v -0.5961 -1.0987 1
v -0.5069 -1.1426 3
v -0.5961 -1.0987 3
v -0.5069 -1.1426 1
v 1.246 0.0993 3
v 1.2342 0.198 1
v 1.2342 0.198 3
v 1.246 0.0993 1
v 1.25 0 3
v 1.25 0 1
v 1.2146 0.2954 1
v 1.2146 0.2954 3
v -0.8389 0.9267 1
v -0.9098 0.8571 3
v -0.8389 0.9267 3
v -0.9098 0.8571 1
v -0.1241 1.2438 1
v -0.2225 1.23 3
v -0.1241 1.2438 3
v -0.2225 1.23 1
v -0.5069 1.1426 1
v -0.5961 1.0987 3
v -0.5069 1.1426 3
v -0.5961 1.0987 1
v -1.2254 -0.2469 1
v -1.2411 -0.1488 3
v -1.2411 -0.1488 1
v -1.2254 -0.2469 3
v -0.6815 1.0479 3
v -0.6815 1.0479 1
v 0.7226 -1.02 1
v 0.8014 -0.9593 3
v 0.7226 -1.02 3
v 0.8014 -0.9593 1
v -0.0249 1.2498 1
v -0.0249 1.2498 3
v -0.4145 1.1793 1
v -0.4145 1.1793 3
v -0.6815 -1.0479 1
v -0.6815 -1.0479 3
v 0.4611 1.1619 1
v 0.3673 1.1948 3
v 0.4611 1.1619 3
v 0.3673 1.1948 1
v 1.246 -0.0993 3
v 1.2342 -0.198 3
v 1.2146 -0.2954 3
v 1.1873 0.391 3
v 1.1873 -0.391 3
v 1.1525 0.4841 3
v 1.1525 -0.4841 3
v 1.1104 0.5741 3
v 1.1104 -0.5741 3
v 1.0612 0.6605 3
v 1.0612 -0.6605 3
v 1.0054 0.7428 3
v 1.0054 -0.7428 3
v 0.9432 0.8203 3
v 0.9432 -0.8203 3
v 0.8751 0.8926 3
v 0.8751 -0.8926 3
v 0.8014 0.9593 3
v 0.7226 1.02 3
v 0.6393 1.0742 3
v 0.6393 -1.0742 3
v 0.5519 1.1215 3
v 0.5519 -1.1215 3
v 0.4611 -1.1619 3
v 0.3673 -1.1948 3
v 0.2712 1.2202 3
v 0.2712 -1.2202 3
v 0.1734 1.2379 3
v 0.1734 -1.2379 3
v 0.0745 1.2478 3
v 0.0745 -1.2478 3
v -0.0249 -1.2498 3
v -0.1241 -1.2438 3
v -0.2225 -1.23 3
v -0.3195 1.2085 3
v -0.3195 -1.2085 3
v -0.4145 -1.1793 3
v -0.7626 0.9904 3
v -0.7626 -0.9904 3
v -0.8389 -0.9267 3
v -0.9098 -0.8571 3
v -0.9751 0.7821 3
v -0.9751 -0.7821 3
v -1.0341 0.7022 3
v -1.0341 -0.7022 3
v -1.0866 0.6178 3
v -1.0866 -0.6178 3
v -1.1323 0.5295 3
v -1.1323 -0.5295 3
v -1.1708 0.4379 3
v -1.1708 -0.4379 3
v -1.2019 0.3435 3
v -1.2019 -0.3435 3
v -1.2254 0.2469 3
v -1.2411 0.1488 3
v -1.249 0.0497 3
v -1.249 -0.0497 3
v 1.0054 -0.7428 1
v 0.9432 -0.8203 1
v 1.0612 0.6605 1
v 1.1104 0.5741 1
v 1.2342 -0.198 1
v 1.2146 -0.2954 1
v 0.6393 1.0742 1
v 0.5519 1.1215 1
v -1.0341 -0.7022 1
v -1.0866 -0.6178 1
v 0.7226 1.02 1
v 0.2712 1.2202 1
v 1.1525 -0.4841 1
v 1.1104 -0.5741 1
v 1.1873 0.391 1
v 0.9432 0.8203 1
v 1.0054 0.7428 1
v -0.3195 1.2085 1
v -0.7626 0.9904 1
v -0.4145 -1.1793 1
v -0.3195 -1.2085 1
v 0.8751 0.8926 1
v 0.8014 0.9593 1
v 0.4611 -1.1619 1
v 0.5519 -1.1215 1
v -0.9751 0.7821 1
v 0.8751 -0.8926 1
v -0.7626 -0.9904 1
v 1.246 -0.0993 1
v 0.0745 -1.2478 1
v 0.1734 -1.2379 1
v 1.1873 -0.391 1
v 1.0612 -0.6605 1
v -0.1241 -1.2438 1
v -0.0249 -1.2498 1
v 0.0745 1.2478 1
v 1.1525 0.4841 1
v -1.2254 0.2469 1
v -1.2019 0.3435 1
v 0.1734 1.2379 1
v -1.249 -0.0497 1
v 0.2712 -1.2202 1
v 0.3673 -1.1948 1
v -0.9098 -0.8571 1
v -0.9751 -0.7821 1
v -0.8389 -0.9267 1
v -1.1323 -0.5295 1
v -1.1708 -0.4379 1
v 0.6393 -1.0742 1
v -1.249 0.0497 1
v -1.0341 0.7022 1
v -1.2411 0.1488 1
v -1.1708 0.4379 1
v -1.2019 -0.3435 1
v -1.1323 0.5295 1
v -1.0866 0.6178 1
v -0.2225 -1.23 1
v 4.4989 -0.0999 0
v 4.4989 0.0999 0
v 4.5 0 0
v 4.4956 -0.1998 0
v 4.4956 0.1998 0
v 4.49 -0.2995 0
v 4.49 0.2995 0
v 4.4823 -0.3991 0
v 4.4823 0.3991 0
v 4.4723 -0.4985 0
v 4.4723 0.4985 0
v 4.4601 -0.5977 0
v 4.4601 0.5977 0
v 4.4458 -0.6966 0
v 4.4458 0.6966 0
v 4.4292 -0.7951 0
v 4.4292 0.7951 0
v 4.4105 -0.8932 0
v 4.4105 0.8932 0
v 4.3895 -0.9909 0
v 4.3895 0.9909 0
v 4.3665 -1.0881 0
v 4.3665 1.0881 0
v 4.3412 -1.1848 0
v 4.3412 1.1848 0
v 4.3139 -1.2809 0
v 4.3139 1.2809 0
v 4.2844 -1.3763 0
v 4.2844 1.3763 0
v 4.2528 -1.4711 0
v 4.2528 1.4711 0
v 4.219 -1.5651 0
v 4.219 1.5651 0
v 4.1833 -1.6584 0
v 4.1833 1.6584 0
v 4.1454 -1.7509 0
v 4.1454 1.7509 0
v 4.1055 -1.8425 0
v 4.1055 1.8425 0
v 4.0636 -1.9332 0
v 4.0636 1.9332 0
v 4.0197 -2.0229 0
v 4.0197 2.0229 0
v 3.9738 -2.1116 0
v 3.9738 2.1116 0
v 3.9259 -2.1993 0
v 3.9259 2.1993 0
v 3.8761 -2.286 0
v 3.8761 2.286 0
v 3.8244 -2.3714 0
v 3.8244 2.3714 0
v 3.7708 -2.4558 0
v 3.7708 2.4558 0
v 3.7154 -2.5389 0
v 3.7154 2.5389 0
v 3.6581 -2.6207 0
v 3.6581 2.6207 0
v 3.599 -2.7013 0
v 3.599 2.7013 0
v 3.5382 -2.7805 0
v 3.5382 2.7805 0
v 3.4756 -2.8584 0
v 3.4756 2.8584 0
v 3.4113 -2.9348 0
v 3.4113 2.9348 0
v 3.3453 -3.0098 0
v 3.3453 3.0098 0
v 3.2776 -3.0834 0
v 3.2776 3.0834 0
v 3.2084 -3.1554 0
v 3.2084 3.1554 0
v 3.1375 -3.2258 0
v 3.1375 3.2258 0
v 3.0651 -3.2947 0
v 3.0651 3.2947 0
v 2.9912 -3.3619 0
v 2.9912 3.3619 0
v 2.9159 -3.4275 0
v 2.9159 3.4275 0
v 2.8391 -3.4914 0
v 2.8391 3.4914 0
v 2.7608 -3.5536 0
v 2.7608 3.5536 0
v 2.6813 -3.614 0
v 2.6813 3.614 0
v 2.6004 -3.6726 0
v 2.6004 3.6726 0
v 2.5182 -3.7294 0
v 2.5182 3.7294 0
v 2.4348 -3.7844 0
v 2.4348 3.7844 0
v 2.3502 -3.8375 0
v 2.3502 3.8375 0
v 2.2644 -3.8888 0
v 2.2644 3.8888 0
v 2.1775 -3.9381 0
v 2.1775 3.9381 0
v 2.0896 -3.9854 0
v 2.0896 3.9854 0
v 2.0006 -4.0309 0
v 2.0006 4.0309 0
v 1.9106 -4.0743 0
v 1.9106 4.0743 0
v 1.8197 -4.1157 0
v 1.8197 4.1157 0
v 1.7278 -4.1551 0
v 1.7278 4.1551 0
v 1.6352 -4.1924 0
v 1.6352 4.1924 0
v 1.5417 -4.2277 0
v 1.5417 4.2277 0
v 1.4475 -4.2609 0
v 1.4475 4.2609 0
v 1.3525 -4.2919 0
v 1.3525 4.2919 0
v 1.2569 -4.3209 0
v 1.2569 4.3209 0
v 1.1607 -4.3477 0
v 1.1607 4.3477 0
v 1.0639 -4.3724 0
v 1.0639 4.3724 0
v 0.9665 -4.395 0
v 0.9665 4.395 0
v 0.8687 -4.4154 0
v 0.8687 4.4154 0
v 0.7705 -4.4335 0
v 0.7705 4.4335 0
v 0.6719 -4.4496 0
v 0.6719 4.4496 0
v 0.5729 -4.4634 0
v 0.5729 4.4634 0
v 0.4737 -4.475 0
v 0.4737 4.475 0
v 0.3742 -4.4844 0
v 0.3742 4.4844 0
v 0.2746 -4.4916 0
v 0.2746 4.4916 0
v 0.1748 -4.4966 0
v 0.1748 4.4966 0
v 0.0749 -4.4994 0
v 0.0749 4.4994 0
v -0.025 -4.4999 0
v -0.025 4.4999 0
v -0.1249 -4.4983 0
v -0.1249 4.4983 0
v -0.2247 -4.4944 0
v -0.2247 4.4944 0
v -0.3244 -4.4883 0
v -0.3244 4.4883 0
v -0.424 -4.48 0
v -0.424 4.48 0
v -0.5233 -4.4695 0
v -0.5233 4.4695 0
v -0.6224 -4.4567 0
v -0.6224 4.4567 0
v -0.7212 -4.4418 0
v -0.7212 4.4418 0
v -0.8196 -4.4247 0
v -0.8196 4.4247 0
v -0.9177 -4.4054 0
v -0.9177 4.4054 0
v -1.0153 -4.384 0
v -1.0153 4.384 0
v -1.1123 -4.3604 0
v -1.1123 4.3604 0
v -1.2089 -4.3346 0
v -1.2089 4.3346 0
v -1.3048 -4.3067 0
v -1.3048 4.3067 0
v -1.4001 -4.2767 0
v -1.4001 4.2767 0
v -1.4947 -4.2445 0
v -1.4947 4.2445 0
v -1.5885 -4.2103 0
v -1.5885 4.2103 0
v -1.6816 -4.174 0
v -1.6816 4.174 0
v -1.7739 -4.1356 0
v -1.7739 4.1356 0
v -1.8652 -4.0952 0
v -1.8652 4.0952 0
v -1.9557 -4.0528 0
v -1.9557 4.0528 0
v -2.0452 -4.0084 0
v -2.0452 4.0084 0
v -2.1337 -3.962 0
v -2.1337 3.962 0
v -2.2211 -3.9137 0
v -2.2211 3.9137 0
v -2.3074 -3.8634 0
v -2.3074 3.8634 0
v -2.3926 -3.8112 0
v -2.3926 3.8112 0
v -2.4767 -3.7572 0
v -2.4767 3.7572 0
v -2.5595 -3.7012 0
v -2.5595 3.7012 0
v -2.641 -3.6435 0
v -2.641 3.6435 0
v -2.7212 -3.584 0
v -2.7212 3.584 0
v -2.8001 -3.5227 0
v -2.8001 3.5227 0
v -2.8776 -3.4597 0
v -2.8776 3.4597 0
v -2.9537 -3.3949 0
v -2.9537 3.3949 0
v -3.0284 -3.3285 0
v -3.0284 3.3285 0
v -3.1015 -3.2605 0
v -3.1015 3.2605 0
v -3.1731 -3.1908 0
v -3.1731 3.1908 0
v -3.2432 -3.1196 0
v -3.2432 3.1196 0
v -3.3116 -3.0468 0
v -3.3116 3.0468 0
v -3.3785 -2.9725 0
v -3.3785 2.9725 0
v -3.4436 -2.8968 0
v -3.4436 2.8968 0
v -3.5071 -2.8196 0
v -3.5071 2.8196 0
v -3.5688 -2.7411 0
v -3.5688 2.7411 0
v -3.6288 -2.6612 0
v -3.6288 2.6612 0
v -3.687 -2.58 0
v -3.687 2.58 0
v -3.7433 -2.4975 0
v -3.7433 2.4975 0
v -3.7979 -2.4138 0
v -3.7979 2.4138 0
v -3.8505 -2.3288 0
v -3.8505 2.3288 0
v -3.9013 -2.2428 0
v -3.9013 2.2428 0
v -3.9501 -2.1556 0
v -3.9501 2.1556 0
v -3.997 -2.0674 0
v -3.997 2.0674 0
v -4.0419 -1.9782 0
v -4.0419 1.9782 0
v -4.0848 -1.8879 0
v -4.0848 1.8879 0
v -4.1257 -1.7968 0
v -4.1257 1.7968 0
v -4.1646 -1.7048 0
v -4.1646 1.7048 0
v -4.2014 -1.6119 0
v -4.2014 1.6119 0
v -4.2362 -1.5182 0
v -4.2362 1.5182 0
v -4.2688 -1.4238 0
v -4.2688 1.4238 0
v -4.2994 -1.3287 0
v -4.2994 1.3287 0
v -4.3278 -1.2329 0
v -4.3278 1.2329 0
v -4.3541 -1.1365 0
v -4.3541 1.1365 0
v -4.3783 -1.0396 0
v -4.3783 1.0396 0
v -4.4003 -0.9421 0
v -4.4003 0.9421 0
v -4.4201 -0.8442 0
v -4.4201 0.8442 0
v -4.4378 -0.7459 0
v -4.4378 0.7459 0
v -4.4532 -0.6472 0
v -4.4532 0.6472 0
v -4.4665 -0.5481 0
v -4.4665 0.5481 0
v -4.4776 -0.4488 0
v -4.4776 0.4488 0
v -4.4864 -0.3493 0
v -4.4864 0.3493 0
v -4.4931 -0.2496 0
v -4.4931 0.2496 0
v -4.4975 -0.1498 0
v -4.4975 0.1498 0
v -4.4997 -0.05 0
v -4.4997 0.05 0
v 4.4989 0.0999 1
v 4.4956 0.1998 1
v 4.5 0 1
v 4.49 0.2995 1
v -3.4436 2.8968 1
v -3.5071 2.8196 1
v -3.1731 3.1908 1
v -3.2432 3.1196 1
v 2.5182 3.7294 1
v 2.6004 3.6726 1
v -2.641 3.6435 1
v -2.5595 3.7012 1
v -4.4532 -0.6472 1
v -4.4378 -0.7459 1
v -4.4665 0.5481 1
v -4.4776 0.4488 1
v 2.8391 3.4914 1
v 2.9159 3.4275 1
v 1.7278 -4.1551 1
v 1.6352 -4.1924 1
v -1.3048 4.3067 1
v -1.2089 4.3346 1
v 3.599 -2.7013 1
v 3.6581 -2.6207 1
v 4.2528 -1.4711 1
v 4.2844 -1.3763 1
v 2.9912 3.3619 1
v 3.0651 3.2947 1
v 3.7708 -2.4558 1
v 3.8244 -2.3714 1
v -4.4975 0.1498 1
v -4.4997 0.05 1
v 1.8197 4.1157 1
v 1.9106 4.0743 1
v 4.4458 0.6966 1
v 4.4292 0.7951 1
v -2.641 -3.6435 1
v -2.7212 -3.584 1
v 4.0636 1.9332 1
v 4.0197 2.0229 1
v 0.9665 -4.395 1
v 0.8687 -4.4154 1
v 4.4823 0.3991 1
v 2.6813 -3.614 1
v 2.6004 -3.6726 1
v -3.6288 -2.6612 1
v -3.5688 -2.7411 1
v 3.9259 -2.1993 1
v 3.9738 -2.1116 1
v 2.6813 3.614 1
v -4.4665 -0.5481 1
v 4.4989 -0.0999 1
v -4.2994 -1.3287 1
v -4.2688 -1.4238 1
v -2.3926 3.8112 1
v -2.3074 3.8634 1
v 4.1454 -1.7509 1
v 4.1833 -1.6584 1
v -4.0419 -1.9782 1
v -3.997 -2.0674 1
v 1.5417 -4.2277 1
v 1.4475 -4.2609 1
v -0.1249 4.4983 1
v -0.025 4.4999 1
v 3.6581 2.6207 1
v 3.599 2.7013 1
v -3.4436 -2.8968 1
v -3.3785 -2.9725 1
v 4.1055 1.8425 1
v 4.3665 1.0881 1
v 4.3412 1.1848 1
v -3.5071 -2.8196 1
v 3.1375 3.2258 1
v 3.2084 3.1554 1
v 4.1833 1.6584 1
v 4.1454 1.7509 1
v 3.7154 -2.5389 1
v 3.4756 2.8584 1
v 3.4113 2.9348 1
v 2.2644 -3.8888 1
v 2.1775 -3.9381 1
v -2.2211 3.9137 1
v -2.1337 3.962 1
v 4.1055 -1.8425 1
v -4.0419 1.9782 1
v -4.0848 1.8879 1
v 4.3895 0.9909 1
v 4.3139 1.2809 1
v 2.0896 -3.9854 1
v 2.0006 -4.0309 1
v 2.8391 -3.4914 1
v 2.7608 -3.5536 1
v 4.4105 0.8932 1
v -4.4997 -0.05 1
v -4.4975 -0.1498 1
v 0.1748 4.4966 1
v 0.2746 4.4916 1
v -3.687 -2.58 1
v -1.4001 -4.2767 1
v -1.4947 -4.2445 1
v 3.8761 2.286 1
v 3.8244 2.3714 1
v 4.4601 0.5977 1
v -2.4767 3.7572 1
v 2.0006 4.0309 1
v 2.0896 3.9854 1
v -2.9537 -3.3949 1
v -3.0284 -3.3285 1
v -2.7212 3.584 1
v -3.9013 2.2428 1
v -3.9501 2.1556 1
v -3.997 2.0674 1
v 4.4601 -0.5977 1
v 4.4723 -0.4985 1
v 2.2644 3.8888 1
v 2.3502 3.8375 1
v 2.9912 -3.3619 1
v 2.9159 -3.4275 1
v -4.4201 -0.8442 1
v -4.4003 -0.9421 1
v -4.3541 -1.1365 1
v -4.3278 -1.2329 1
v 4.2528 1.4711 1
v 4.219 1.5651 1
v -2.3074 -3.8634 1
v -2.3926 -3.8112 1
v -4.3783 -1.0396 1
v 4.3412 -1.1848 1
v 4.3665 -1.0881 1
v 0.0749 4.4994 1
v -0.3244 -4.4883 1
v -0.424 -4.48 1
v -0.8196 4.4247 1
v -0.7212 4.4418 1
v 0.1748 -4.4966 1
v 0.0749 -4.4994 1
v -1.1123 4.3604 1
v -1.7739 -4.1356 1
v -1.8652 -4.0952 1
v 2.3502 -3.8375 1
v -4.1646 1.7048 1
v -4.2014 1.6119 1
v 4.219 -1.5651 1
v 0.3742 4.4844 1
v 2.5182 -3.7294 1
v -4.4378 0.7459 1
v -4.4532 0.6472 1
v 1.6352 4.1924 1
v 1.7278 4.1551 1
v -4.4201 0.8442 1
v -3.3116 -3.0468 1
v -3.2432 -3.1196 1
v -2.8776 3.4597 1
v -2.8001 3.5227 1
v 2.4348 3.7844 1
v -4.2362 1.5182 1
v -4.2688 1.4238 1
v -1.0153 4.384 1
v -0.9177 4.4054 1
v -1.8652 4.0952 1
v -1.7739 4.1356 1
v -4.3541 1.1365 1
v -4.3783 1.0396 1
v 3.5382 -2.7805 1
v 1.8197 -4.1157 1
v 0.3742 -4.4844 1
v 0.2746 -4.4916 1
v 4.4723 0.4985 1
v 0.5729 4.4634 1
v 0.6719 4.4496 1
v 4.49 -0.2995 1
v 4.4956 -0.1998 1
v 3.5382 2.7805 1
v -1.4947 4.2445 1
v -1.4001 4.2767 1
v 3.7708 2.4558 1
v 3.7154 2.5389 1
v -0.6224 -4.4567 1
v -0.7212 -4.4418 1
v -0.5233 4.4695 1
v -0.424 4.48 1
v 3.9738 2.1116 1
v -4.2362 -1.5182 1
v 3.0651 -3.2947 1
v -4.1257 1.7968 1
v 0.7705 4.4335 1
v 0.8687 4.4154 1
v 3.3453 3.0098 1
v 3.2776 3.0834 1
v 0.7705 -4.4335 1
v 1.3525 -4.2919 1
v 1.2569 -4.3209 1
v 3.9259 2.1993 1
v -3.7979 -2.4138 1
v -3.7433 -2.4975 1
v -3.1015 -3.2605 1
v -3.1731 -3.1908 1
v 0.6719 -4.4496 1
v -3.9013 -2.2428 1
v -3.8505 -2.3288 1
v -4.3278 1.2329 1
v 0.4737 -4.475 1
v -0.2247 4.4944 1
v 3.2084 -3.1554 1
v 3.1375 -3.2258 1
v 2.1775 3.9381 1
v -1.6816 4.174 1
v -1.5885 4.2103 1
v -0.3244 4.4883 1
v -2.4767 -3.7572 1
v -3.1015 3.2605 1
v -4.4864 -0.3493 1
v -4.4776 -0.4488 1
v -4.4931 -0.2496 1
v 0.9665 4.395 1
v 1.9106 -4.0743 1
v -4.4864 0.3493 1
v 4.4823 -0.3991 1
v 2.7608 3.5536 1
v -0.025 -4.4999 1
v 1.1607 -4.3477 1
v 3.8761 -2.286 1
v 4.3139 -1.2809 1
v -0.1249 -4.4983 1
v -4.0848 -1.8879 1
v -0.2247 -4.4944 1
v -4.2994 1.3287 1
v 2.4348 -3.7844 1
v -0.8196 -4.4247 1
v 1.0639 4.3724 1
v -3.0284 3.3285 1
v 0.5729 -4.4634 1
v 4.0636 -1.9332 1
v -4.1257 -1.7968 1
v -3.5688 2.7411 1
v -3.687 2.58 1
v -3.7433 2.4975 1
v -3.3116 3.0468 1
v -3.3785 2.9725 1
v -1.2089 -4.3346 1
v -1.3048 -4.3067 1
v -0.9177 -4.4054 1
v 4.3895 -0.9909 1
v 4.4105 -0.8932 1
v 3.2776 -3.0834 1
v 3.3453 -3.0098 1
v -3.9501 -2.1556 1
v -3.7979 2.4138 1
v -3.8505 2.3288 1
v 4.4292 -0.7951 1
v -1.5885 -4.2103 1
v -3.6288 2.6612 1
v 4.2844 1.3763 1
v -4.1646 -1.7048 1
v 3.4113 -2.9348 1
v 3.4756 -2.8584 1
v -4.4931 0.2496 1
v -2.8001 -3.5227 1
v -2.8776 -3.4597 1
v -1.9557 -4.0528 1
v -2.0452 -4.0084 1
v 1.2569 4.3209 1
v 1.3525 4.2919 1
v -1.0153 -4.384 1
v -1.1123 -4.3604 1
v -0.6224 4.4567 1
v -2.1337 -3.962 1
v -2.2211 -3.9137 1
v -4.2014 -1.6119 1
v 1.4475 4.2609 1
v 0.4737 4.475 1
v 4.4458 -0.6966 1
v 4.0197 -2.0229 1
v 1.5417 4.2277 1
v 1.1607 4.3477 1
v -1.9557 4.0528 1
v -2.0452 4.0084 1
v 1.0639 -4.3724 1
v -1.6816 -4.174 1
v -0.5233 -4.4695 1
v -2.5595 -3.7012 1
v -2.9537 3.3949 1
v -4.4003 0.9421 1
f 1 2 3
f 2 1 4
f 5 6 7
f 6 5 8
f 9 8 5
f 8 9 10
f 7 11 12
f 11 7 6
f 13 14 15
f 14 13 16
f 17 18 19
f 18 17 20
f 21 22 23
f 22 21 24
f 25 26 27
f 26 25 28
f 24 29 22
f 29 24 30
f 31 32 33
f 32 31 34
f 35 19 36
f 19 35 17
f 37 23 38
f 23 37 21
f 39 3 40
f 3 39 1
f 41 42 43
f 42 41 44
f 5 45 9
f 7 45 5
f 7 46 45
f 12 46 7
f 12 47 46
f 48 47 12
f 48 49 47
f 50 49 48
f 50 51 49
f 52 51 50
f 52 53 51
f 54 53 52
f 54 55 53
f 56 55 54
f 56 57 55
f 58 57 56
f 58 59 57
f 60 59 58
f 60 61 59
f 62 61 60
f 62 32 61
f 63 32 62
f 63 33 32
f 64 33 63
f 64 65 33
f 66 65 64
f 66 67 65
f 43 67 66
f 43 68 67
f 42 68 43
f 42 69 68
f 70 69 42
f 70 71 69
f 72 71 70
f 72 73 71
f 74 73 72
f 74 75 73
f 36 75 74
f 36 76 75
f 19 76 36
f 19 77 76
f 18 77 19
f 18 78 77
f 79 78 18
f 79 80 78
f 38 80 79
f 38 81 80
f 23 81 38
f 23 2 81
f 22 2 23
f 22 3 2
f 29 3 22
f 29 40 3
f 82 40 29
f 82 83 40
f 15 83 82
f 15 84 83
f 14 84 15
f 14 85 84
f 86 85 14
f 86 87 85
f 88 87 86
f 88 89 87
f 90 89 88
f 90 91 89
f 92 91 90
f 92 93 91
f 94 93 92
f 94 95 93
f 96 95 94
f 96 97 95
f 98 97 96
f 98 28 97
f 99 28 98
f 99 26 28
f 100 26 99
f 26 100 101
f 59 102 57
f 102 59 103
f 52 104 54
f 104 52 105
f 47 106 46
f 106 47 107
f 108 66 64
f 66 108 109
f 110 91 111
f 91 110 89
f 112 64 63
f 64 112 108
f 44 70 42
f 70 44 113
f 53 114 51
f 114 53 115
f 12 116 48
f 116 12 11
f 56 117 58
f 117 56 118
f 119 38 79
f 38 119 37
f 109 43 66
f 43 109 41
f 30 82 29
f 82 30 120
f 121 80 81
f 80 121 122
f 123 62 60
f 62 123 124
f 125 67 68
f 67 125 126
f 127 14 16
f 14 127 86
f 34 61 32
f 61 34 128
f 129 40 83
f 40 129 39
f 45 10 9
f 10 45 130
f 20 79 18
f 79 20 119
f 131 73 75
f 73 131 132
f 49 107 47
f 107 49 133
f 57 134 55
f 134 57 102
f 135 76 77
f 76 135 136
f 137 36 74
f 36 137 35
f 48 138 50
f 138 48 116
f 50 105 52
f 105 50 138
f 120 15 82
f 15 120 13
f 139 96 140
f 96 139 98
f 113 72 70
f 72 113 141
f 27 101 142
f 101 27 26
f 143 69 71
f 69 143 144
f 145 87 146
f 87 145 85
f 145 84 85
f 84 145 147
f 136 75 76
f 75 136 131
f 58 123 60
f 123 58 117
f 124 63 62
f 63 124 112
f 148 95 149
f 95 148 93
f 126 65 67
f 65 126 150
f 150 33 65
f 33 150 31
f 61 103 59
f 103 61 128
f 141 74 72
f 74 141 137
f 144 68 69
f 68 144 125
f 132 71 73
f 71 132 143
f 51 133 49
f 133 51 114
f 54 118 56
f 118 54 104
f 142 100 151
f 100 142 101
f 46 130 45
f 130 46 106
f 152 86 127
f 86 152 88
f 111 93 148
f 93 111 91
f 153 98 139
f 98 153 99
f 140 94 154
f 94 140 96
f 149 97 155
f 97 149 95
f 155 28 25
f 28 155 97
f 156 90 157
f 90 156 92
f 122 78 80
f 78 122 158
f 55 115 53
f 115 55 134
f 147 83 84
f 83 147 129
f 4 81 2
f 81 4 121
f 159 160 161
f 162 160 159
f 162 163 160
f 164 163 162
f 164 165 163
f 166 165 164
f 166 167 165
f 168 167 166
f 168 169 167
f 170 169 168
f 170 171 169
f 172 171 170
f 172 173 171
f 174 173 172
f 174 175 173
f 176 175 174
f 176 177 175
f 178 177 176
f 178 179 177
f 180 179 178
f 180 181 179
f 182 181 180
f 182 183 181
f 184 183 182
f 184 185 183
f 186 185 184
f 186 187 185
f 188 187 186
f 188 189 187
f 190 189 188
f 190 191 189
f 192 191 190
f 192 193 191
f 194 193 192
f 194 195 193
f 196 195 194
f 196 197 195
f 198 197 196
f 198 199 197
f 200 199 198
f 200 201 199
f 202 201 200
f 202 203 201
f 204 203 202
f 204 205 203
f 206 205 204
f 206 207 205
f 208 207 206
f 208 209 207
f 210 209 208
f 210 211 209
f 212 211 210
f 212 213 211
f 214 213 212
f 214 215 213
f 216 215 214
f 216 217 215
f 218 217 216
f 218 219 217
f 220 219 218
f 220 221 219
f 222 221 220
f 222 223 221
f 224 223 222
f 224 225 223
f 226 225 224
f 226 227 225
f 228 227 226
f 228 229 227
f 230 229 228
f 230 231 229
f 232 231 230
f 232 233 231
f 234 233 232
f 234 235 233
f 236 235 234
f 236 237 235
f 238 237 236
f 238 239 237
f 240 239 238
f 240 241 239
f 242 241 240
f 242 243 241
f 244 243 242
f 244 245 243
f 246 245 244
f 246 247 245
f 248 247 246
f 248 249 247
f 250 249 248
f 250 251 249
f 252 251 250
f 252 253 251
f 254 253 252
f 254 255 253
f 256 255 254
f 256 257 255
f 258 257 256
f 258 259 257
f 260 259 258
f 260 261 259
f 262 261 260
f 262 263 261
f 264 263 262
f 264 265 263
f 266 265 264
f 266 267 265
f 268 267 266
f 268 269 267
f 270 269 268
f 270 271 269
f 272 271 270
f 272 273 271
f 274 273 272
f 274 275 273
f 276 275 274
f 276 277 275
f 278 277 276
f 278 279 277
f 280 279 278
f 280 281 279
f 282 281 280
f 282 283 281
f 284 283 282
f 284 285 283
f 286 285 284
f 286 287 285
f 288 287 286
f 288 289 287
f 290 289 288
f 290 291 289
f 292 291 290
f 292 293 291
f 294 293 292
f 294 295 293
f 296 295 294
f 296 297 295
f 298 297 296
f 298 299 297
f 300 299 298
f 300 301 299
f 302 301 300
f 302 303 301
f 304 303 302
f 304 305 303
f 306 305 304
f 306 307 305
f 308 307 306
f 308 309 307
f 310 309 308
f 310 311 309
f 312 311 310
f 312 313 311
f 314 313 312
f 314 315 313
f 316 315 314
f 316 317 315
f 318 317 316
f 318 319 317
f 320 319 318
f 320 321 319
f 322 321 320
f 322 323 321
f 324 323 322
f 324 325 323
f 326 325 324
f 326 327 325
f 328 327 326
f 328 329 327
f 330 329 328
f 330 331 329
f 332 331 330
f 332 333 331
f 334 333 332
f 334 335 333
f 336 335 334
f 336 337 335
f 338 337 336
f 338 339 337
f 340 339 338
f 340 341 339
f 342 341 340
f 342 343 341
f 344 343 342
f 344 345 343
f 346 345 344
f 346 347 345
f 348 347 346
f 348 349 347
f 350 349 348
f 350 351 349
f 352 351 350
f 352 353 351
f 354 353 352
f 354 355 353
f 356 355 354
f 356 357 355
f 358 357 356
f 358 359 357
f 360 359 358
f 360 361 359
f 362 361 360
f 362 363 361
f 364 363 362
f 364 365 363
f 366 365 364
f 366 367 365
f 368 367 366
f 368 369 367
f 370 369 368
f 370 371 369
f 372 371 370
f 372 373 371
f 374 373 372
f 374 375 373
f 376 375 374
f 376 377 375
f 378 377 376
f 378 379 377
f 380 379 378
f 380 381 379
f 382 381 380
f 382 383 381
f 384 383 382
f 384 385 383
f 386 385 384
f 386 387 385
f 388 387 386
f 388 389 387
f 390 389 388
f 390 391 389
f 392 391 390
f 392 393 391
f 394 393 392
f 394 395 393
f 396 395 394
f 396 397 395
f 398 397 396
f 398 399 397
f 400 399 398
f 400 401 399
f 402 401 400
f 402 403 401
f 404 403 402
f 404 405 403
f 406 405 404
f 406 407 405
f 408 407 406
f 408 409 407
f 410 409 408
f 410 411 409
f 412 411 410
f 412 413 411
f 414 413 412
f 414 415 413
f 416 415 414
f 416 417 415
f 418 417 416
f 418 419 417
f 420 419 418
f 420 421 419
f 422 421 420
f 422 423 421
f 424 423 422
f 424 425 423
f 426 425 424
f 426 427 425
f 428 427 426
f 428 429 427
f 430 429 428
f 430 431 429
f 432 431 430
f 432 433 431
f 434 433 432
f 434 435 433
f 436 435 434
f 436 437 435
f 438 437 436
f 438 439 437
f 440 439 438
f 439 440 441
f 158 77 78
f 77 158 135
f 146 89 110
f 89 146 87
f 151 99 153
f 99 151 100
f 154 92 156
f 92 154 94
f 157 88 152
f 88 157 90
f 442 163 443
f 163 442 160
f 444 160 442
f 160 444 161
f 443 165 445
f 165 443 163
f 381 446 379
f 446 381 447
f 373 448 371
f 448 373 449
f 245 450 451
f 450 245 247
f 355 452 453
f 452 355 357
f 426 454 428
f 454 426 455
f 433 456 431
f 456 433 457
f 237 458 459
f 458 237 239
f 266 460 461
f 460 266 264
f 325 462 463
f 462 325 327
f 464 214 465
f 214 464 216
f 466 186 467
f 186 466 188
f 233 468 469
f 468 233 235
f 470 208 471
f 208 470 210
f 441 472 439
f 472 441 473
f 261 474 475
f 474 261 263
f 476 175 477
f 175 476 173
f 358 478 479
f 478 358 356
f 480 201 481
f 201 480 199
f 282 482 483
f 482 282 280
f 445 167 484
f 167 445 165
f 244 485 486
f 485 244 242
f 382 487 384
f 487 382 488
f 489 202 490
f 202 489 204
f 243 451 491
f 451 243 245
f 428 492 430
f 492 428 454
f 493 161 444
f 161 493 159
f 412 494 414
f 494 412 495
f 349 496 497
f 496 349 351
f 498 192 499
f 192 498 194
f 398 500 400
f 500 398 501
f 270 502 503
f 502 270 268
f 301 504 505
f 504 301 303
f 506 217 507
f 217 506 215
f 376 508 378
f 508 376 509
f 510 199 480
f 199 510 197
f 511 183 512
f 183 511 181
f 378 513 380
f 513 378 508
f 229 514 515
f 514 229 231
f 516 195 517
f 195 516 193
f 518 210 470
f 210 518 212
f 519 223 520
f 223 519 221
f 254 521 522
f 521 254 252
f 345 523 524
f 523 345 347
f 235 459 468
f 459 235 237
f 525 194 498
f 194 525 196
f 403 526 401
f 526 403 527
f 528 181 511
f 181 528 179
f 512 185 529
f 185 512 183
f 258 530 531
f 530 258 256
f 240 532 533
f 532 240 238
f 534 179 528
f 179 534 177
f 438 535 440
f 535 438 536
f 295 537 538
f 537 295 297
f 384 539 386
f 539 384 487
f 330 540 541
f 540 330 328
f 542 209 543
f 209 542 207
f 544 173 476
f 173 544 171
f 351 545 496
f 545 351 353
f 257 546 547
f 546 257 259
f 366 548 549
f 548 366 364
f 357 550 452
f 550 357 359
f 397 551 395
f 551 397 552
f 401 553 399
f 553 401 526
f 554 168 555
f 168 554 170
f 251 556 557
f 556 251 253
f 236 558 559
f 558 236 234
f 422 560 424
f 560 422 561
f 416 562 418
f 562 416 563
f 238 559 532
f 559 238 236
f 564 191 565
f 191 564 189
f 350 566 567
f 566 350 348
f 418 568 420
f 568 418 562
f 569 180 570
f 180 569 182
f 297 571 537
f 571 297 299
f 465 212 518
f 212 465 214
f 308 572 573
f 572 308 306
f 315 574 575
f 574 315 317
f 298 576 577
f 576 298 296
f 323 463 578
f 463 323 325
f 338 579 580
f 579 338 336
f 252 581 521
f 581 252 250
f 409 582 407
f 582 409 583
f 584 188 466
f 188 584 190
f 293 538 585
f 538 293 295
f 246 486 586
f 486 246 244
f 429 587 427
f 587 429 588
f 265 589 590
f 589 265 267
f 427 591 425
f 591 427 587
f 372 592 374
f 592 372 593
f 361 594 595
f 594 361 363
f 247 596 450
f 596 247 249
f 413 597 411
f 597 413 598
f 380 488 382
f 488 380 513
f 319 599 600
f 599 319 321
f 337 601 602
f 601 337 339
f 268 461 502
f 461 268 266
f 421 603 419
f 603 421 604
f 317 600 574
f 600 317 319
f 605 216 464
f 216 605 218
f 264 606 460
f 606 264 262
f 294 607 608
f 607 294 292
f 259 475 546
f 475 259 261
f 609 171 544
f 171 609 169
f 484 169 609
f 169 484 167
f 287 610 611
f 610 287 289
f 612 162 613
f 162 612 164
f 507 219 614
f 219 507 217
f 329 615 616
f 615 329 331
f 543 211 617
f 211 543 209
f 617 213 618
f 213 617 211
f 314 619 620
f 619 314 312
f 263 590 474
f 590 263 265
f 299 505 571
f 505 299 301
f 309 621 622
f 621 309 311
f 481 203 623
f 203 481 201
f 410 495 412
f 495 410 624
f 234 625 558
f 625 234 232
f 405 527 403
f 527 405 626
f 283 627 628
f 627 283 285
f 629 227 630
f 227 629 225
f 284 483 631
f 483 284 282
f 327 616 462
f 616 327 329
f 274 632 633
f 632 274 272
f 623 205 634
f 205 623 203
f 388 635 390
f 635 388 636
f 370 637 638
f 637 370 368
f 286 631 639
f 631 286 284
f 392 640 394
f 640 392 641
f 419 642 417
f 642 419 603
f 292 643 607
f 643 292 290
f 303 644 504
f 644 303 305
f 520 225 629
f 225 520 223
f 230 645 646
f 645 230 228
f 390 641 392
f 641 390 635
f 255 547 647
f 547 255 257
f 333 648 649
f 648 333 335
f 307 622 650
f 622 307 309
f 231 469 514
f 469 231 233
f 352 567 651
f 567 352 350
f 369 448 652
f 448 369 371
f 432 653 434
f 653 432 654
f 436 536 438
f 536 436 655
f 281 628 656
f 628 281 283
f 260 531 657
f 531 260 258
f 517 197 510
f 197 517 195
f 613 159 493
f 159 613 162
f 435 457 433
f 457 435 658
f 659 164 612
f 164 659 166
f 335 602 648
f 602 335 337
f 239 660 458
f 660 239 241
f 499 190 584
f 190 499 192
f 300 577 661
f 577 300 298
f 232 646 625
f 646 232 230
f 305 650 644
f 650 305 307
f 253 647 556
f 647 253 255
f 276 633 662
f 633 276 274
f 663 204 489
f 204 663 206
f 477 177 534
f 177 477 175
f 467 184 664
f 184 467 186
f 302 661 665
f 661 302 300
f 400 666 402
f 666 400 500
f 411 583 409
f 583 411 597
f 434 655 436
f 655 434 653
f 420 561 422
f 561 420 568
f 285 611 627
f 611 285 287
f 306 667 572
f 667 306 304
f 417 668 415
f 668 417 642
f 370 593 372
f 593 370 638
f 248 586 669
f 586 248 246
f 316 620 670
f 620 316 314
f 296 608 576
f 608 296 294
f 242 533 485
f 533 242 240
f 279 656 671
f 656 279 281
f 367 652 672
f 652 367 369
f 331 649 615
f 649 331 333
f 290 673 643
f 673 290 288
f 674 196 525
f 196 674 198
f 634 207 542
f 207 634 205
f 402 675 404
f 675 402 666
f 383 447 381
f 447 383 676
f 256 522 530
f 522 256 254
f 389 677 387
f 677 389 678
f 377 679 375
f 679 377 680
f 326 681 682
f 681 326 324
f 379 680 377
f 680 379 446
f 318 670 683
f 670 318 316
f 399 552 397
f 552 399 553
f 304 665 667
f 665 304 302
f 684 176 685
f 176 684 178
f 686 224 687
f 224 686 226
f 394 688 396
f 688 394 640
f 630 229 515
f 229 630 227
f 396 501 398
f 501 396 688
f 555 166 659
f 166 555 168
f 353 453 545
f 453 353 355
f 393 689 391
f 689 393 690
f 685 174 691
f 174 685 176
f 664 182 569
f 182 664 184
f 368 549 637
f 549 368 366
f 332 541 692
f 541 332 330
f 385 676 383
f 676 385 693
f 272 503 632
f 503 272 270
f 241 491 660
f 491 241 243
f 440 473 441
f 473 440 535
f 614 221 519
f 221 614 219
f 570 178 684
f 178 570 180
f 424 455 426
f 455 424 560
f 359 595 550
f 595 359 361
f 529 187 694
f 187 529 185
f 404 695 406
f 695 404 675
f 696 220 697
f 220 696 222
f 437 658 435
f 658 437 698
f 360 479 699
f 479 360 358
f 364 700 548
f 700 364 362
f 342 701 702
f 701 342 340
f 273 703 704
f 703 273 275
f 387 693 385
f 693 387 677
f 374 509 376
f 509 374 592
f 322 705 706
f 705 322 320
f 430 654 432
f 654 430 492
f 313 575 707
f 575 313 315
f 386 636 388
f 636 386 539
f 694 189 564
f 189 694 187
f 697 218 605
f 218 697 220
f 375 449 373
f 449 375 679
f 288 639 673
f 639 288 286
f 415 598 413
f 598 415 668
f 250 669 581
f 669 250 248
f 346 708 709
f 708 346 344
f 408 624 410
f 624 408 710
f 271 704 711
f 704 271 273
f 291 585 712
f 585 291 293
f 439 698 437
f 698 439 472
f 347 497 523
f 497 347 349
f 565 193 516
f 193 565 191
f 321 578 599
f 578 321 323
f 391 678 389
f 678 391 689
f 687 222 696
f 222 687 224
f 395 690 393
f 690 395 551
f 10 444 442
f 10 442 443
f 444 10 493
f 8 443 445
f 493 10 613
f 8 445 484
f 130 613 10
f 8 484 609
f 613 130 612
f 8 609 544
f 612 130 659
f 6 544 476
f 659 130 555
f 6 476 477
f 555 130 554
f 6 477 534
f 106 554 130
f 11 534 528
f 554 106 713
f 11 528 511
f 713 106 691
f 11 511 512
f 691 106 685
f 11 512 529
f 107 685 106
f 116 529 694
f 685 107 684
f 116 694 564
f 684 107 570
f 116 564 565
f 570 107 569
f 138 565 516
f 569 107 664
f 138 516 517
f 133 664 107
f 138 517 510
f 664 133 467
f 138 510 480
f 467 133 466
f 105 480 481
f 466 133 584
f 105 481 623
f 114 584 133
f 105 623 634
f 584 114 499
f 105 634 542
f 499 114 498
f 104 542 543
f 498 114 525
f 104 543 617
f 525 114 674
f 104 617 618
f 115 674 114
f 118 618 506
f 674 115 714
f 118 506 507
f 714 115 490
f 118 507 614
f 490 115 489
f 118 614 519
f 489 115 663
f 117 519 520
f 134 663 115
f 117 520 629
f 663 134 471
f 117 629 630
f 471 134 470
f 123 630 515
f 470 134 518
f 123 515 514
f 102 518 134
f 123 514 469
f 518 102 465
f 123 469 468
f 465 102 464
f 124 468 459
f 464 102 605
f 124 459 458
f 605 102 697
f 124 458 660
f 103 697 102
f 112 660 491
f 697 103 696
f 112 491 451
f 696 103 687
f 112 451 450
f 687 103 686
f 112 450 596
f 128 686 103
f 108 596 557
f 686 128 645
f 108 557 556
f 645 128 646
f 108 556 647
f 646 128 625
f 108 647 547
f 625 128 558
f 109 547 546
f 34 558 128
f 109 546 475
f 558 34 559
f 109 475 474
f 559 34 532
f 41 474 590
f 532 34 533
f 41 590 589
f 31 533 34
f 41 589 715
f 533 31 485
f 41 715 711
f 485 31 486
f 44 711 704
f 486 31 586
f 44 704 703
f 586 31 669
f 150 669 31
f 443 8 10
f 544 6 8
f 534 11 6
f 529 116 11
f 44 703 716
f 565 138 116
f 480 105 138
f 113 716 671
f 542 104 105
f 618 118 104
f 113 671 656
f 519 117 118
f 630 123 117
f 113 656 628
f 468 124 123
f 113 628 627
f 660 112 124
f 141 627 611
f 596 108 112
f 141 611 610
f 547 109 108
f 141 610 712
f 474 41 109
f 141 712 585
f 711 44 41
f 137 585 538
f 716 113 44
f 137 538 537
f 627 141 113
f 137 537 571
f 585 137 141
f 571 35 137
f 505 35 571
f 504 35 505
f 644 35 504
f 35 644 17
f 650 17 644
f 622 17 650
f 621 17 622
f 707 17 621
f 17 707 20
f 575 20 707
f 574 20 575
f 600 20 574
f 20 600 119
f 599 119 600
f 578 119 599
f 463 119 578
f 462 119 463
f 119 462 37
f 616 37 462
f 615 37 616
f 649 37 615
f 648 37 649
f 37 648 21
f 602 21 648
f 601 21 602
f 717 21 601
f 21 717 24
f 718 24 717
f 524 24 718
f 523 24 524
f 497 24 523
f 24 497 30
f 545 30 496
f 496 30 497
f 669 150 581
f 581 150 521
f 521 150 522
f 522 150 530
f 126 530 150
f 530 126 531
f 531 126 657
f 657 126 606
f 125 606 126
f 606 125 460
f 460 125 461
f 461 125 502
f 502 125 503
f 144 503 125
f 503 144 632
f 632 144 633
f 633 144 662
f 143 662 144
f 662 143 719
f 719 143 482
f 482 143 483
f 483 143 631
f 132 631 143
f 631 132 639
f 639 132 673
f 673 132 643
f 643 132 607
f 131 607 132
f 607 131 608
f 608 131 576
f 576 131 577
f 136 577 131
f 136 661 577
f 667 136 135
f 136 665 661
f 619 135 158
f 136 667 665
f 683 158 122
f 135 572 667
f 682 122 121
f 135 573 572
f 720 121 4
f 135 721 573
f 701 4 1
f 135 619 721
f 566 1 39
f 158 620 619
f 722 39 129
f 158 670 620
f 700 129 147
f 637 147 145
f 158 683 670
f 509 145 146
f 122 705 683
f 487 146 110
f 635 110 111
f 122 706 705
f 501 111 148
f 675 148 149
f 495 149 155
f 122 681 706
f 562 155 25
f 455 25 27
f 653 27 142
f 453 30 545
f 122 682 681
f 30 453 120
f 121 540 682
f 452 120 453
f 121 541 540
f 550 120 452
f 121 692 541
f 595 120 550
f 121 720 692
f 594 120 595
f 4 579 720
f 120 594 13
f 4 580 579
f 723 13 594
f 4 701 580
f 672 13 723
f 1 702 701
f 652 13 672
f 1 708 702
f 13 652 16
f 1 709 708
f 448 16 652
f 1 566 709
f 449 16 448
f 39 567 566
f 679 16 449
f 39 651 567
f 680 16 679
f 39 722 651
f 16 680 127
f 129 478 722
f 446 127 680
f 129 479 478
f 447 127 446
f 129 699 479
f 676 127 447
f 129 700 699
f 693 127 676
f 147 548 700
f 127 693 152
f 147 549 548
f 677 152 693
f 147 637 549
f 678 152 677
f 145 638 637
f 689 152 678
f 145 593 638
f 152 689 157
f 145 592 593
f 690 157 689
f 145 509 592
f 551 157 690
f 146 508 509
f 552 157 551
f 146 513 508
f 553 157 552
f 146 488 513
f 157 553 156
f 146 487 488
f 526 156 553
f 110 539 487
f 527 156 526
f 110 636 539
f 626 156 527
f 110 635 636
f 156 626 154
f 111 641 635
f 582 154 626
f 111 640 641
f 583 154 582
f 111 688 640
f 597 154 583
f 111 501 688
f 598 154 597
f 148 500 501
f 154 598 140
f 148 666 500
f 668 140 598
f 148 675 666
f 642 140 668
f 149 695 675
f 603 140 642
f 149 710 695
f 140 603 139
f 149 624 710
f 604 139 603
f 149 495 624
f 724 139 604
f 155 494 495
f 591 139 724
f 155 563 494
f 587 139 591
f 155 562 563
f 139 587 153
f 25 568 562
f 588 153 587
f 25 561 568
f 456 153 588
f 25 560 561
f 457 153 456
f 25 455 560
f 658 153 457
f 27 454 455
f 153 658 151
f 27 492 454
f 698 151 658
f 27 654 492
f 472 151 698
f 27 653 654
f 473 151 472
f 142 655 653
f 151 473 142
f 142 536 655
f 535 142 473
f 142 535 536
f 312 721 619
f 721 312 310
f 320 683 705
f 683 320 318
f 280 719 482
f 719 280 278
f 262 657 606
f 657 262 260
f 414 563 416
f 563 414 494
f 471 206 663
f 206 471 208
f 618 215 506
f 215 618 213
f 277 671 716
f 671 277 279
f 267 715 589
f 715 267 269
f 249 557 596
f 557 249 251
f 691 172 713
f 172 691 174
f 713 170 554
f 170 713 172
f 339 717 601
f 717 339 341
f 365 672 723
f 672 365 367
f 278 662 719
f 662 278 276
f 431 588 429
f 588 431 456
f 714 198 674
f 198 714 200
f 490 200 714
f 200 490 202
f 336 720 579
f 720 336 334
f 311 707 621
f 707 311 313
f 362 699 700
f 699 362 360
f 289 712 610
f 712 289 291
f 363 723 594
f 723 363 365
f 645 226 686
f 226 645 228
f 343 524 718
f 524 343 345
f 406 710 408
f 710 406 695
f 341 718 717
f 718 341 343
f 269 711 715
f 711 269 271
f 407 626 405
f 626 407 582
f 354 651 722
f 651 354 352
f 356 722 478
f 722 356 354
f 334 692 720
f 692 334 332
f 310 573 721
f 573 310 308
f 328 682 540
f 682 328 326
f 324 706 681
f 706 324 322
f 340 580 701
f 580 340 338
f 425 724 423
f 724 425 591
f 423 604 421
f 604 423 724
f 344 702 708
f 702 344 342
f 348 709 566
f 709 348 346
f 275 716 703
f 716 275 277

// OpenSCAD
// -*- mode: SCAD ; c-file-style: "ellemtel" ; coding: utf-8 -*-
//
// Buchsen oder Unterlegscheiben, nach Bedarf
//
// © 2017 Roland Sieker <ospalh@gmail.com>
// Licence: CC-0 4.0

d_i = 2.5;
r_i = d_i/2;
h1 = 1;
h2 = 2;
d_o = 9;
r_o = d_o/2;
ms = 0.01;  // Muggeseggele


preview = 0;

// fn for differently sized objects and fs, fa; all for preview or rendering.
pna = 40;
pnb = 15;
pa = 5;
ps = 1;
rna = 180;
rnb = 30;
ra = 1;
rs = 0.1;
function na() = (preview) ? pna : rna;
function nb() = (preview) ? pnb : rnb;
$fs = (preview) ? ps : rs;
$fa = (preview) ? pa : ra;


cylinder(r=r_i, h=h1+h2);
cylinder(r=r_o, h=h1);
